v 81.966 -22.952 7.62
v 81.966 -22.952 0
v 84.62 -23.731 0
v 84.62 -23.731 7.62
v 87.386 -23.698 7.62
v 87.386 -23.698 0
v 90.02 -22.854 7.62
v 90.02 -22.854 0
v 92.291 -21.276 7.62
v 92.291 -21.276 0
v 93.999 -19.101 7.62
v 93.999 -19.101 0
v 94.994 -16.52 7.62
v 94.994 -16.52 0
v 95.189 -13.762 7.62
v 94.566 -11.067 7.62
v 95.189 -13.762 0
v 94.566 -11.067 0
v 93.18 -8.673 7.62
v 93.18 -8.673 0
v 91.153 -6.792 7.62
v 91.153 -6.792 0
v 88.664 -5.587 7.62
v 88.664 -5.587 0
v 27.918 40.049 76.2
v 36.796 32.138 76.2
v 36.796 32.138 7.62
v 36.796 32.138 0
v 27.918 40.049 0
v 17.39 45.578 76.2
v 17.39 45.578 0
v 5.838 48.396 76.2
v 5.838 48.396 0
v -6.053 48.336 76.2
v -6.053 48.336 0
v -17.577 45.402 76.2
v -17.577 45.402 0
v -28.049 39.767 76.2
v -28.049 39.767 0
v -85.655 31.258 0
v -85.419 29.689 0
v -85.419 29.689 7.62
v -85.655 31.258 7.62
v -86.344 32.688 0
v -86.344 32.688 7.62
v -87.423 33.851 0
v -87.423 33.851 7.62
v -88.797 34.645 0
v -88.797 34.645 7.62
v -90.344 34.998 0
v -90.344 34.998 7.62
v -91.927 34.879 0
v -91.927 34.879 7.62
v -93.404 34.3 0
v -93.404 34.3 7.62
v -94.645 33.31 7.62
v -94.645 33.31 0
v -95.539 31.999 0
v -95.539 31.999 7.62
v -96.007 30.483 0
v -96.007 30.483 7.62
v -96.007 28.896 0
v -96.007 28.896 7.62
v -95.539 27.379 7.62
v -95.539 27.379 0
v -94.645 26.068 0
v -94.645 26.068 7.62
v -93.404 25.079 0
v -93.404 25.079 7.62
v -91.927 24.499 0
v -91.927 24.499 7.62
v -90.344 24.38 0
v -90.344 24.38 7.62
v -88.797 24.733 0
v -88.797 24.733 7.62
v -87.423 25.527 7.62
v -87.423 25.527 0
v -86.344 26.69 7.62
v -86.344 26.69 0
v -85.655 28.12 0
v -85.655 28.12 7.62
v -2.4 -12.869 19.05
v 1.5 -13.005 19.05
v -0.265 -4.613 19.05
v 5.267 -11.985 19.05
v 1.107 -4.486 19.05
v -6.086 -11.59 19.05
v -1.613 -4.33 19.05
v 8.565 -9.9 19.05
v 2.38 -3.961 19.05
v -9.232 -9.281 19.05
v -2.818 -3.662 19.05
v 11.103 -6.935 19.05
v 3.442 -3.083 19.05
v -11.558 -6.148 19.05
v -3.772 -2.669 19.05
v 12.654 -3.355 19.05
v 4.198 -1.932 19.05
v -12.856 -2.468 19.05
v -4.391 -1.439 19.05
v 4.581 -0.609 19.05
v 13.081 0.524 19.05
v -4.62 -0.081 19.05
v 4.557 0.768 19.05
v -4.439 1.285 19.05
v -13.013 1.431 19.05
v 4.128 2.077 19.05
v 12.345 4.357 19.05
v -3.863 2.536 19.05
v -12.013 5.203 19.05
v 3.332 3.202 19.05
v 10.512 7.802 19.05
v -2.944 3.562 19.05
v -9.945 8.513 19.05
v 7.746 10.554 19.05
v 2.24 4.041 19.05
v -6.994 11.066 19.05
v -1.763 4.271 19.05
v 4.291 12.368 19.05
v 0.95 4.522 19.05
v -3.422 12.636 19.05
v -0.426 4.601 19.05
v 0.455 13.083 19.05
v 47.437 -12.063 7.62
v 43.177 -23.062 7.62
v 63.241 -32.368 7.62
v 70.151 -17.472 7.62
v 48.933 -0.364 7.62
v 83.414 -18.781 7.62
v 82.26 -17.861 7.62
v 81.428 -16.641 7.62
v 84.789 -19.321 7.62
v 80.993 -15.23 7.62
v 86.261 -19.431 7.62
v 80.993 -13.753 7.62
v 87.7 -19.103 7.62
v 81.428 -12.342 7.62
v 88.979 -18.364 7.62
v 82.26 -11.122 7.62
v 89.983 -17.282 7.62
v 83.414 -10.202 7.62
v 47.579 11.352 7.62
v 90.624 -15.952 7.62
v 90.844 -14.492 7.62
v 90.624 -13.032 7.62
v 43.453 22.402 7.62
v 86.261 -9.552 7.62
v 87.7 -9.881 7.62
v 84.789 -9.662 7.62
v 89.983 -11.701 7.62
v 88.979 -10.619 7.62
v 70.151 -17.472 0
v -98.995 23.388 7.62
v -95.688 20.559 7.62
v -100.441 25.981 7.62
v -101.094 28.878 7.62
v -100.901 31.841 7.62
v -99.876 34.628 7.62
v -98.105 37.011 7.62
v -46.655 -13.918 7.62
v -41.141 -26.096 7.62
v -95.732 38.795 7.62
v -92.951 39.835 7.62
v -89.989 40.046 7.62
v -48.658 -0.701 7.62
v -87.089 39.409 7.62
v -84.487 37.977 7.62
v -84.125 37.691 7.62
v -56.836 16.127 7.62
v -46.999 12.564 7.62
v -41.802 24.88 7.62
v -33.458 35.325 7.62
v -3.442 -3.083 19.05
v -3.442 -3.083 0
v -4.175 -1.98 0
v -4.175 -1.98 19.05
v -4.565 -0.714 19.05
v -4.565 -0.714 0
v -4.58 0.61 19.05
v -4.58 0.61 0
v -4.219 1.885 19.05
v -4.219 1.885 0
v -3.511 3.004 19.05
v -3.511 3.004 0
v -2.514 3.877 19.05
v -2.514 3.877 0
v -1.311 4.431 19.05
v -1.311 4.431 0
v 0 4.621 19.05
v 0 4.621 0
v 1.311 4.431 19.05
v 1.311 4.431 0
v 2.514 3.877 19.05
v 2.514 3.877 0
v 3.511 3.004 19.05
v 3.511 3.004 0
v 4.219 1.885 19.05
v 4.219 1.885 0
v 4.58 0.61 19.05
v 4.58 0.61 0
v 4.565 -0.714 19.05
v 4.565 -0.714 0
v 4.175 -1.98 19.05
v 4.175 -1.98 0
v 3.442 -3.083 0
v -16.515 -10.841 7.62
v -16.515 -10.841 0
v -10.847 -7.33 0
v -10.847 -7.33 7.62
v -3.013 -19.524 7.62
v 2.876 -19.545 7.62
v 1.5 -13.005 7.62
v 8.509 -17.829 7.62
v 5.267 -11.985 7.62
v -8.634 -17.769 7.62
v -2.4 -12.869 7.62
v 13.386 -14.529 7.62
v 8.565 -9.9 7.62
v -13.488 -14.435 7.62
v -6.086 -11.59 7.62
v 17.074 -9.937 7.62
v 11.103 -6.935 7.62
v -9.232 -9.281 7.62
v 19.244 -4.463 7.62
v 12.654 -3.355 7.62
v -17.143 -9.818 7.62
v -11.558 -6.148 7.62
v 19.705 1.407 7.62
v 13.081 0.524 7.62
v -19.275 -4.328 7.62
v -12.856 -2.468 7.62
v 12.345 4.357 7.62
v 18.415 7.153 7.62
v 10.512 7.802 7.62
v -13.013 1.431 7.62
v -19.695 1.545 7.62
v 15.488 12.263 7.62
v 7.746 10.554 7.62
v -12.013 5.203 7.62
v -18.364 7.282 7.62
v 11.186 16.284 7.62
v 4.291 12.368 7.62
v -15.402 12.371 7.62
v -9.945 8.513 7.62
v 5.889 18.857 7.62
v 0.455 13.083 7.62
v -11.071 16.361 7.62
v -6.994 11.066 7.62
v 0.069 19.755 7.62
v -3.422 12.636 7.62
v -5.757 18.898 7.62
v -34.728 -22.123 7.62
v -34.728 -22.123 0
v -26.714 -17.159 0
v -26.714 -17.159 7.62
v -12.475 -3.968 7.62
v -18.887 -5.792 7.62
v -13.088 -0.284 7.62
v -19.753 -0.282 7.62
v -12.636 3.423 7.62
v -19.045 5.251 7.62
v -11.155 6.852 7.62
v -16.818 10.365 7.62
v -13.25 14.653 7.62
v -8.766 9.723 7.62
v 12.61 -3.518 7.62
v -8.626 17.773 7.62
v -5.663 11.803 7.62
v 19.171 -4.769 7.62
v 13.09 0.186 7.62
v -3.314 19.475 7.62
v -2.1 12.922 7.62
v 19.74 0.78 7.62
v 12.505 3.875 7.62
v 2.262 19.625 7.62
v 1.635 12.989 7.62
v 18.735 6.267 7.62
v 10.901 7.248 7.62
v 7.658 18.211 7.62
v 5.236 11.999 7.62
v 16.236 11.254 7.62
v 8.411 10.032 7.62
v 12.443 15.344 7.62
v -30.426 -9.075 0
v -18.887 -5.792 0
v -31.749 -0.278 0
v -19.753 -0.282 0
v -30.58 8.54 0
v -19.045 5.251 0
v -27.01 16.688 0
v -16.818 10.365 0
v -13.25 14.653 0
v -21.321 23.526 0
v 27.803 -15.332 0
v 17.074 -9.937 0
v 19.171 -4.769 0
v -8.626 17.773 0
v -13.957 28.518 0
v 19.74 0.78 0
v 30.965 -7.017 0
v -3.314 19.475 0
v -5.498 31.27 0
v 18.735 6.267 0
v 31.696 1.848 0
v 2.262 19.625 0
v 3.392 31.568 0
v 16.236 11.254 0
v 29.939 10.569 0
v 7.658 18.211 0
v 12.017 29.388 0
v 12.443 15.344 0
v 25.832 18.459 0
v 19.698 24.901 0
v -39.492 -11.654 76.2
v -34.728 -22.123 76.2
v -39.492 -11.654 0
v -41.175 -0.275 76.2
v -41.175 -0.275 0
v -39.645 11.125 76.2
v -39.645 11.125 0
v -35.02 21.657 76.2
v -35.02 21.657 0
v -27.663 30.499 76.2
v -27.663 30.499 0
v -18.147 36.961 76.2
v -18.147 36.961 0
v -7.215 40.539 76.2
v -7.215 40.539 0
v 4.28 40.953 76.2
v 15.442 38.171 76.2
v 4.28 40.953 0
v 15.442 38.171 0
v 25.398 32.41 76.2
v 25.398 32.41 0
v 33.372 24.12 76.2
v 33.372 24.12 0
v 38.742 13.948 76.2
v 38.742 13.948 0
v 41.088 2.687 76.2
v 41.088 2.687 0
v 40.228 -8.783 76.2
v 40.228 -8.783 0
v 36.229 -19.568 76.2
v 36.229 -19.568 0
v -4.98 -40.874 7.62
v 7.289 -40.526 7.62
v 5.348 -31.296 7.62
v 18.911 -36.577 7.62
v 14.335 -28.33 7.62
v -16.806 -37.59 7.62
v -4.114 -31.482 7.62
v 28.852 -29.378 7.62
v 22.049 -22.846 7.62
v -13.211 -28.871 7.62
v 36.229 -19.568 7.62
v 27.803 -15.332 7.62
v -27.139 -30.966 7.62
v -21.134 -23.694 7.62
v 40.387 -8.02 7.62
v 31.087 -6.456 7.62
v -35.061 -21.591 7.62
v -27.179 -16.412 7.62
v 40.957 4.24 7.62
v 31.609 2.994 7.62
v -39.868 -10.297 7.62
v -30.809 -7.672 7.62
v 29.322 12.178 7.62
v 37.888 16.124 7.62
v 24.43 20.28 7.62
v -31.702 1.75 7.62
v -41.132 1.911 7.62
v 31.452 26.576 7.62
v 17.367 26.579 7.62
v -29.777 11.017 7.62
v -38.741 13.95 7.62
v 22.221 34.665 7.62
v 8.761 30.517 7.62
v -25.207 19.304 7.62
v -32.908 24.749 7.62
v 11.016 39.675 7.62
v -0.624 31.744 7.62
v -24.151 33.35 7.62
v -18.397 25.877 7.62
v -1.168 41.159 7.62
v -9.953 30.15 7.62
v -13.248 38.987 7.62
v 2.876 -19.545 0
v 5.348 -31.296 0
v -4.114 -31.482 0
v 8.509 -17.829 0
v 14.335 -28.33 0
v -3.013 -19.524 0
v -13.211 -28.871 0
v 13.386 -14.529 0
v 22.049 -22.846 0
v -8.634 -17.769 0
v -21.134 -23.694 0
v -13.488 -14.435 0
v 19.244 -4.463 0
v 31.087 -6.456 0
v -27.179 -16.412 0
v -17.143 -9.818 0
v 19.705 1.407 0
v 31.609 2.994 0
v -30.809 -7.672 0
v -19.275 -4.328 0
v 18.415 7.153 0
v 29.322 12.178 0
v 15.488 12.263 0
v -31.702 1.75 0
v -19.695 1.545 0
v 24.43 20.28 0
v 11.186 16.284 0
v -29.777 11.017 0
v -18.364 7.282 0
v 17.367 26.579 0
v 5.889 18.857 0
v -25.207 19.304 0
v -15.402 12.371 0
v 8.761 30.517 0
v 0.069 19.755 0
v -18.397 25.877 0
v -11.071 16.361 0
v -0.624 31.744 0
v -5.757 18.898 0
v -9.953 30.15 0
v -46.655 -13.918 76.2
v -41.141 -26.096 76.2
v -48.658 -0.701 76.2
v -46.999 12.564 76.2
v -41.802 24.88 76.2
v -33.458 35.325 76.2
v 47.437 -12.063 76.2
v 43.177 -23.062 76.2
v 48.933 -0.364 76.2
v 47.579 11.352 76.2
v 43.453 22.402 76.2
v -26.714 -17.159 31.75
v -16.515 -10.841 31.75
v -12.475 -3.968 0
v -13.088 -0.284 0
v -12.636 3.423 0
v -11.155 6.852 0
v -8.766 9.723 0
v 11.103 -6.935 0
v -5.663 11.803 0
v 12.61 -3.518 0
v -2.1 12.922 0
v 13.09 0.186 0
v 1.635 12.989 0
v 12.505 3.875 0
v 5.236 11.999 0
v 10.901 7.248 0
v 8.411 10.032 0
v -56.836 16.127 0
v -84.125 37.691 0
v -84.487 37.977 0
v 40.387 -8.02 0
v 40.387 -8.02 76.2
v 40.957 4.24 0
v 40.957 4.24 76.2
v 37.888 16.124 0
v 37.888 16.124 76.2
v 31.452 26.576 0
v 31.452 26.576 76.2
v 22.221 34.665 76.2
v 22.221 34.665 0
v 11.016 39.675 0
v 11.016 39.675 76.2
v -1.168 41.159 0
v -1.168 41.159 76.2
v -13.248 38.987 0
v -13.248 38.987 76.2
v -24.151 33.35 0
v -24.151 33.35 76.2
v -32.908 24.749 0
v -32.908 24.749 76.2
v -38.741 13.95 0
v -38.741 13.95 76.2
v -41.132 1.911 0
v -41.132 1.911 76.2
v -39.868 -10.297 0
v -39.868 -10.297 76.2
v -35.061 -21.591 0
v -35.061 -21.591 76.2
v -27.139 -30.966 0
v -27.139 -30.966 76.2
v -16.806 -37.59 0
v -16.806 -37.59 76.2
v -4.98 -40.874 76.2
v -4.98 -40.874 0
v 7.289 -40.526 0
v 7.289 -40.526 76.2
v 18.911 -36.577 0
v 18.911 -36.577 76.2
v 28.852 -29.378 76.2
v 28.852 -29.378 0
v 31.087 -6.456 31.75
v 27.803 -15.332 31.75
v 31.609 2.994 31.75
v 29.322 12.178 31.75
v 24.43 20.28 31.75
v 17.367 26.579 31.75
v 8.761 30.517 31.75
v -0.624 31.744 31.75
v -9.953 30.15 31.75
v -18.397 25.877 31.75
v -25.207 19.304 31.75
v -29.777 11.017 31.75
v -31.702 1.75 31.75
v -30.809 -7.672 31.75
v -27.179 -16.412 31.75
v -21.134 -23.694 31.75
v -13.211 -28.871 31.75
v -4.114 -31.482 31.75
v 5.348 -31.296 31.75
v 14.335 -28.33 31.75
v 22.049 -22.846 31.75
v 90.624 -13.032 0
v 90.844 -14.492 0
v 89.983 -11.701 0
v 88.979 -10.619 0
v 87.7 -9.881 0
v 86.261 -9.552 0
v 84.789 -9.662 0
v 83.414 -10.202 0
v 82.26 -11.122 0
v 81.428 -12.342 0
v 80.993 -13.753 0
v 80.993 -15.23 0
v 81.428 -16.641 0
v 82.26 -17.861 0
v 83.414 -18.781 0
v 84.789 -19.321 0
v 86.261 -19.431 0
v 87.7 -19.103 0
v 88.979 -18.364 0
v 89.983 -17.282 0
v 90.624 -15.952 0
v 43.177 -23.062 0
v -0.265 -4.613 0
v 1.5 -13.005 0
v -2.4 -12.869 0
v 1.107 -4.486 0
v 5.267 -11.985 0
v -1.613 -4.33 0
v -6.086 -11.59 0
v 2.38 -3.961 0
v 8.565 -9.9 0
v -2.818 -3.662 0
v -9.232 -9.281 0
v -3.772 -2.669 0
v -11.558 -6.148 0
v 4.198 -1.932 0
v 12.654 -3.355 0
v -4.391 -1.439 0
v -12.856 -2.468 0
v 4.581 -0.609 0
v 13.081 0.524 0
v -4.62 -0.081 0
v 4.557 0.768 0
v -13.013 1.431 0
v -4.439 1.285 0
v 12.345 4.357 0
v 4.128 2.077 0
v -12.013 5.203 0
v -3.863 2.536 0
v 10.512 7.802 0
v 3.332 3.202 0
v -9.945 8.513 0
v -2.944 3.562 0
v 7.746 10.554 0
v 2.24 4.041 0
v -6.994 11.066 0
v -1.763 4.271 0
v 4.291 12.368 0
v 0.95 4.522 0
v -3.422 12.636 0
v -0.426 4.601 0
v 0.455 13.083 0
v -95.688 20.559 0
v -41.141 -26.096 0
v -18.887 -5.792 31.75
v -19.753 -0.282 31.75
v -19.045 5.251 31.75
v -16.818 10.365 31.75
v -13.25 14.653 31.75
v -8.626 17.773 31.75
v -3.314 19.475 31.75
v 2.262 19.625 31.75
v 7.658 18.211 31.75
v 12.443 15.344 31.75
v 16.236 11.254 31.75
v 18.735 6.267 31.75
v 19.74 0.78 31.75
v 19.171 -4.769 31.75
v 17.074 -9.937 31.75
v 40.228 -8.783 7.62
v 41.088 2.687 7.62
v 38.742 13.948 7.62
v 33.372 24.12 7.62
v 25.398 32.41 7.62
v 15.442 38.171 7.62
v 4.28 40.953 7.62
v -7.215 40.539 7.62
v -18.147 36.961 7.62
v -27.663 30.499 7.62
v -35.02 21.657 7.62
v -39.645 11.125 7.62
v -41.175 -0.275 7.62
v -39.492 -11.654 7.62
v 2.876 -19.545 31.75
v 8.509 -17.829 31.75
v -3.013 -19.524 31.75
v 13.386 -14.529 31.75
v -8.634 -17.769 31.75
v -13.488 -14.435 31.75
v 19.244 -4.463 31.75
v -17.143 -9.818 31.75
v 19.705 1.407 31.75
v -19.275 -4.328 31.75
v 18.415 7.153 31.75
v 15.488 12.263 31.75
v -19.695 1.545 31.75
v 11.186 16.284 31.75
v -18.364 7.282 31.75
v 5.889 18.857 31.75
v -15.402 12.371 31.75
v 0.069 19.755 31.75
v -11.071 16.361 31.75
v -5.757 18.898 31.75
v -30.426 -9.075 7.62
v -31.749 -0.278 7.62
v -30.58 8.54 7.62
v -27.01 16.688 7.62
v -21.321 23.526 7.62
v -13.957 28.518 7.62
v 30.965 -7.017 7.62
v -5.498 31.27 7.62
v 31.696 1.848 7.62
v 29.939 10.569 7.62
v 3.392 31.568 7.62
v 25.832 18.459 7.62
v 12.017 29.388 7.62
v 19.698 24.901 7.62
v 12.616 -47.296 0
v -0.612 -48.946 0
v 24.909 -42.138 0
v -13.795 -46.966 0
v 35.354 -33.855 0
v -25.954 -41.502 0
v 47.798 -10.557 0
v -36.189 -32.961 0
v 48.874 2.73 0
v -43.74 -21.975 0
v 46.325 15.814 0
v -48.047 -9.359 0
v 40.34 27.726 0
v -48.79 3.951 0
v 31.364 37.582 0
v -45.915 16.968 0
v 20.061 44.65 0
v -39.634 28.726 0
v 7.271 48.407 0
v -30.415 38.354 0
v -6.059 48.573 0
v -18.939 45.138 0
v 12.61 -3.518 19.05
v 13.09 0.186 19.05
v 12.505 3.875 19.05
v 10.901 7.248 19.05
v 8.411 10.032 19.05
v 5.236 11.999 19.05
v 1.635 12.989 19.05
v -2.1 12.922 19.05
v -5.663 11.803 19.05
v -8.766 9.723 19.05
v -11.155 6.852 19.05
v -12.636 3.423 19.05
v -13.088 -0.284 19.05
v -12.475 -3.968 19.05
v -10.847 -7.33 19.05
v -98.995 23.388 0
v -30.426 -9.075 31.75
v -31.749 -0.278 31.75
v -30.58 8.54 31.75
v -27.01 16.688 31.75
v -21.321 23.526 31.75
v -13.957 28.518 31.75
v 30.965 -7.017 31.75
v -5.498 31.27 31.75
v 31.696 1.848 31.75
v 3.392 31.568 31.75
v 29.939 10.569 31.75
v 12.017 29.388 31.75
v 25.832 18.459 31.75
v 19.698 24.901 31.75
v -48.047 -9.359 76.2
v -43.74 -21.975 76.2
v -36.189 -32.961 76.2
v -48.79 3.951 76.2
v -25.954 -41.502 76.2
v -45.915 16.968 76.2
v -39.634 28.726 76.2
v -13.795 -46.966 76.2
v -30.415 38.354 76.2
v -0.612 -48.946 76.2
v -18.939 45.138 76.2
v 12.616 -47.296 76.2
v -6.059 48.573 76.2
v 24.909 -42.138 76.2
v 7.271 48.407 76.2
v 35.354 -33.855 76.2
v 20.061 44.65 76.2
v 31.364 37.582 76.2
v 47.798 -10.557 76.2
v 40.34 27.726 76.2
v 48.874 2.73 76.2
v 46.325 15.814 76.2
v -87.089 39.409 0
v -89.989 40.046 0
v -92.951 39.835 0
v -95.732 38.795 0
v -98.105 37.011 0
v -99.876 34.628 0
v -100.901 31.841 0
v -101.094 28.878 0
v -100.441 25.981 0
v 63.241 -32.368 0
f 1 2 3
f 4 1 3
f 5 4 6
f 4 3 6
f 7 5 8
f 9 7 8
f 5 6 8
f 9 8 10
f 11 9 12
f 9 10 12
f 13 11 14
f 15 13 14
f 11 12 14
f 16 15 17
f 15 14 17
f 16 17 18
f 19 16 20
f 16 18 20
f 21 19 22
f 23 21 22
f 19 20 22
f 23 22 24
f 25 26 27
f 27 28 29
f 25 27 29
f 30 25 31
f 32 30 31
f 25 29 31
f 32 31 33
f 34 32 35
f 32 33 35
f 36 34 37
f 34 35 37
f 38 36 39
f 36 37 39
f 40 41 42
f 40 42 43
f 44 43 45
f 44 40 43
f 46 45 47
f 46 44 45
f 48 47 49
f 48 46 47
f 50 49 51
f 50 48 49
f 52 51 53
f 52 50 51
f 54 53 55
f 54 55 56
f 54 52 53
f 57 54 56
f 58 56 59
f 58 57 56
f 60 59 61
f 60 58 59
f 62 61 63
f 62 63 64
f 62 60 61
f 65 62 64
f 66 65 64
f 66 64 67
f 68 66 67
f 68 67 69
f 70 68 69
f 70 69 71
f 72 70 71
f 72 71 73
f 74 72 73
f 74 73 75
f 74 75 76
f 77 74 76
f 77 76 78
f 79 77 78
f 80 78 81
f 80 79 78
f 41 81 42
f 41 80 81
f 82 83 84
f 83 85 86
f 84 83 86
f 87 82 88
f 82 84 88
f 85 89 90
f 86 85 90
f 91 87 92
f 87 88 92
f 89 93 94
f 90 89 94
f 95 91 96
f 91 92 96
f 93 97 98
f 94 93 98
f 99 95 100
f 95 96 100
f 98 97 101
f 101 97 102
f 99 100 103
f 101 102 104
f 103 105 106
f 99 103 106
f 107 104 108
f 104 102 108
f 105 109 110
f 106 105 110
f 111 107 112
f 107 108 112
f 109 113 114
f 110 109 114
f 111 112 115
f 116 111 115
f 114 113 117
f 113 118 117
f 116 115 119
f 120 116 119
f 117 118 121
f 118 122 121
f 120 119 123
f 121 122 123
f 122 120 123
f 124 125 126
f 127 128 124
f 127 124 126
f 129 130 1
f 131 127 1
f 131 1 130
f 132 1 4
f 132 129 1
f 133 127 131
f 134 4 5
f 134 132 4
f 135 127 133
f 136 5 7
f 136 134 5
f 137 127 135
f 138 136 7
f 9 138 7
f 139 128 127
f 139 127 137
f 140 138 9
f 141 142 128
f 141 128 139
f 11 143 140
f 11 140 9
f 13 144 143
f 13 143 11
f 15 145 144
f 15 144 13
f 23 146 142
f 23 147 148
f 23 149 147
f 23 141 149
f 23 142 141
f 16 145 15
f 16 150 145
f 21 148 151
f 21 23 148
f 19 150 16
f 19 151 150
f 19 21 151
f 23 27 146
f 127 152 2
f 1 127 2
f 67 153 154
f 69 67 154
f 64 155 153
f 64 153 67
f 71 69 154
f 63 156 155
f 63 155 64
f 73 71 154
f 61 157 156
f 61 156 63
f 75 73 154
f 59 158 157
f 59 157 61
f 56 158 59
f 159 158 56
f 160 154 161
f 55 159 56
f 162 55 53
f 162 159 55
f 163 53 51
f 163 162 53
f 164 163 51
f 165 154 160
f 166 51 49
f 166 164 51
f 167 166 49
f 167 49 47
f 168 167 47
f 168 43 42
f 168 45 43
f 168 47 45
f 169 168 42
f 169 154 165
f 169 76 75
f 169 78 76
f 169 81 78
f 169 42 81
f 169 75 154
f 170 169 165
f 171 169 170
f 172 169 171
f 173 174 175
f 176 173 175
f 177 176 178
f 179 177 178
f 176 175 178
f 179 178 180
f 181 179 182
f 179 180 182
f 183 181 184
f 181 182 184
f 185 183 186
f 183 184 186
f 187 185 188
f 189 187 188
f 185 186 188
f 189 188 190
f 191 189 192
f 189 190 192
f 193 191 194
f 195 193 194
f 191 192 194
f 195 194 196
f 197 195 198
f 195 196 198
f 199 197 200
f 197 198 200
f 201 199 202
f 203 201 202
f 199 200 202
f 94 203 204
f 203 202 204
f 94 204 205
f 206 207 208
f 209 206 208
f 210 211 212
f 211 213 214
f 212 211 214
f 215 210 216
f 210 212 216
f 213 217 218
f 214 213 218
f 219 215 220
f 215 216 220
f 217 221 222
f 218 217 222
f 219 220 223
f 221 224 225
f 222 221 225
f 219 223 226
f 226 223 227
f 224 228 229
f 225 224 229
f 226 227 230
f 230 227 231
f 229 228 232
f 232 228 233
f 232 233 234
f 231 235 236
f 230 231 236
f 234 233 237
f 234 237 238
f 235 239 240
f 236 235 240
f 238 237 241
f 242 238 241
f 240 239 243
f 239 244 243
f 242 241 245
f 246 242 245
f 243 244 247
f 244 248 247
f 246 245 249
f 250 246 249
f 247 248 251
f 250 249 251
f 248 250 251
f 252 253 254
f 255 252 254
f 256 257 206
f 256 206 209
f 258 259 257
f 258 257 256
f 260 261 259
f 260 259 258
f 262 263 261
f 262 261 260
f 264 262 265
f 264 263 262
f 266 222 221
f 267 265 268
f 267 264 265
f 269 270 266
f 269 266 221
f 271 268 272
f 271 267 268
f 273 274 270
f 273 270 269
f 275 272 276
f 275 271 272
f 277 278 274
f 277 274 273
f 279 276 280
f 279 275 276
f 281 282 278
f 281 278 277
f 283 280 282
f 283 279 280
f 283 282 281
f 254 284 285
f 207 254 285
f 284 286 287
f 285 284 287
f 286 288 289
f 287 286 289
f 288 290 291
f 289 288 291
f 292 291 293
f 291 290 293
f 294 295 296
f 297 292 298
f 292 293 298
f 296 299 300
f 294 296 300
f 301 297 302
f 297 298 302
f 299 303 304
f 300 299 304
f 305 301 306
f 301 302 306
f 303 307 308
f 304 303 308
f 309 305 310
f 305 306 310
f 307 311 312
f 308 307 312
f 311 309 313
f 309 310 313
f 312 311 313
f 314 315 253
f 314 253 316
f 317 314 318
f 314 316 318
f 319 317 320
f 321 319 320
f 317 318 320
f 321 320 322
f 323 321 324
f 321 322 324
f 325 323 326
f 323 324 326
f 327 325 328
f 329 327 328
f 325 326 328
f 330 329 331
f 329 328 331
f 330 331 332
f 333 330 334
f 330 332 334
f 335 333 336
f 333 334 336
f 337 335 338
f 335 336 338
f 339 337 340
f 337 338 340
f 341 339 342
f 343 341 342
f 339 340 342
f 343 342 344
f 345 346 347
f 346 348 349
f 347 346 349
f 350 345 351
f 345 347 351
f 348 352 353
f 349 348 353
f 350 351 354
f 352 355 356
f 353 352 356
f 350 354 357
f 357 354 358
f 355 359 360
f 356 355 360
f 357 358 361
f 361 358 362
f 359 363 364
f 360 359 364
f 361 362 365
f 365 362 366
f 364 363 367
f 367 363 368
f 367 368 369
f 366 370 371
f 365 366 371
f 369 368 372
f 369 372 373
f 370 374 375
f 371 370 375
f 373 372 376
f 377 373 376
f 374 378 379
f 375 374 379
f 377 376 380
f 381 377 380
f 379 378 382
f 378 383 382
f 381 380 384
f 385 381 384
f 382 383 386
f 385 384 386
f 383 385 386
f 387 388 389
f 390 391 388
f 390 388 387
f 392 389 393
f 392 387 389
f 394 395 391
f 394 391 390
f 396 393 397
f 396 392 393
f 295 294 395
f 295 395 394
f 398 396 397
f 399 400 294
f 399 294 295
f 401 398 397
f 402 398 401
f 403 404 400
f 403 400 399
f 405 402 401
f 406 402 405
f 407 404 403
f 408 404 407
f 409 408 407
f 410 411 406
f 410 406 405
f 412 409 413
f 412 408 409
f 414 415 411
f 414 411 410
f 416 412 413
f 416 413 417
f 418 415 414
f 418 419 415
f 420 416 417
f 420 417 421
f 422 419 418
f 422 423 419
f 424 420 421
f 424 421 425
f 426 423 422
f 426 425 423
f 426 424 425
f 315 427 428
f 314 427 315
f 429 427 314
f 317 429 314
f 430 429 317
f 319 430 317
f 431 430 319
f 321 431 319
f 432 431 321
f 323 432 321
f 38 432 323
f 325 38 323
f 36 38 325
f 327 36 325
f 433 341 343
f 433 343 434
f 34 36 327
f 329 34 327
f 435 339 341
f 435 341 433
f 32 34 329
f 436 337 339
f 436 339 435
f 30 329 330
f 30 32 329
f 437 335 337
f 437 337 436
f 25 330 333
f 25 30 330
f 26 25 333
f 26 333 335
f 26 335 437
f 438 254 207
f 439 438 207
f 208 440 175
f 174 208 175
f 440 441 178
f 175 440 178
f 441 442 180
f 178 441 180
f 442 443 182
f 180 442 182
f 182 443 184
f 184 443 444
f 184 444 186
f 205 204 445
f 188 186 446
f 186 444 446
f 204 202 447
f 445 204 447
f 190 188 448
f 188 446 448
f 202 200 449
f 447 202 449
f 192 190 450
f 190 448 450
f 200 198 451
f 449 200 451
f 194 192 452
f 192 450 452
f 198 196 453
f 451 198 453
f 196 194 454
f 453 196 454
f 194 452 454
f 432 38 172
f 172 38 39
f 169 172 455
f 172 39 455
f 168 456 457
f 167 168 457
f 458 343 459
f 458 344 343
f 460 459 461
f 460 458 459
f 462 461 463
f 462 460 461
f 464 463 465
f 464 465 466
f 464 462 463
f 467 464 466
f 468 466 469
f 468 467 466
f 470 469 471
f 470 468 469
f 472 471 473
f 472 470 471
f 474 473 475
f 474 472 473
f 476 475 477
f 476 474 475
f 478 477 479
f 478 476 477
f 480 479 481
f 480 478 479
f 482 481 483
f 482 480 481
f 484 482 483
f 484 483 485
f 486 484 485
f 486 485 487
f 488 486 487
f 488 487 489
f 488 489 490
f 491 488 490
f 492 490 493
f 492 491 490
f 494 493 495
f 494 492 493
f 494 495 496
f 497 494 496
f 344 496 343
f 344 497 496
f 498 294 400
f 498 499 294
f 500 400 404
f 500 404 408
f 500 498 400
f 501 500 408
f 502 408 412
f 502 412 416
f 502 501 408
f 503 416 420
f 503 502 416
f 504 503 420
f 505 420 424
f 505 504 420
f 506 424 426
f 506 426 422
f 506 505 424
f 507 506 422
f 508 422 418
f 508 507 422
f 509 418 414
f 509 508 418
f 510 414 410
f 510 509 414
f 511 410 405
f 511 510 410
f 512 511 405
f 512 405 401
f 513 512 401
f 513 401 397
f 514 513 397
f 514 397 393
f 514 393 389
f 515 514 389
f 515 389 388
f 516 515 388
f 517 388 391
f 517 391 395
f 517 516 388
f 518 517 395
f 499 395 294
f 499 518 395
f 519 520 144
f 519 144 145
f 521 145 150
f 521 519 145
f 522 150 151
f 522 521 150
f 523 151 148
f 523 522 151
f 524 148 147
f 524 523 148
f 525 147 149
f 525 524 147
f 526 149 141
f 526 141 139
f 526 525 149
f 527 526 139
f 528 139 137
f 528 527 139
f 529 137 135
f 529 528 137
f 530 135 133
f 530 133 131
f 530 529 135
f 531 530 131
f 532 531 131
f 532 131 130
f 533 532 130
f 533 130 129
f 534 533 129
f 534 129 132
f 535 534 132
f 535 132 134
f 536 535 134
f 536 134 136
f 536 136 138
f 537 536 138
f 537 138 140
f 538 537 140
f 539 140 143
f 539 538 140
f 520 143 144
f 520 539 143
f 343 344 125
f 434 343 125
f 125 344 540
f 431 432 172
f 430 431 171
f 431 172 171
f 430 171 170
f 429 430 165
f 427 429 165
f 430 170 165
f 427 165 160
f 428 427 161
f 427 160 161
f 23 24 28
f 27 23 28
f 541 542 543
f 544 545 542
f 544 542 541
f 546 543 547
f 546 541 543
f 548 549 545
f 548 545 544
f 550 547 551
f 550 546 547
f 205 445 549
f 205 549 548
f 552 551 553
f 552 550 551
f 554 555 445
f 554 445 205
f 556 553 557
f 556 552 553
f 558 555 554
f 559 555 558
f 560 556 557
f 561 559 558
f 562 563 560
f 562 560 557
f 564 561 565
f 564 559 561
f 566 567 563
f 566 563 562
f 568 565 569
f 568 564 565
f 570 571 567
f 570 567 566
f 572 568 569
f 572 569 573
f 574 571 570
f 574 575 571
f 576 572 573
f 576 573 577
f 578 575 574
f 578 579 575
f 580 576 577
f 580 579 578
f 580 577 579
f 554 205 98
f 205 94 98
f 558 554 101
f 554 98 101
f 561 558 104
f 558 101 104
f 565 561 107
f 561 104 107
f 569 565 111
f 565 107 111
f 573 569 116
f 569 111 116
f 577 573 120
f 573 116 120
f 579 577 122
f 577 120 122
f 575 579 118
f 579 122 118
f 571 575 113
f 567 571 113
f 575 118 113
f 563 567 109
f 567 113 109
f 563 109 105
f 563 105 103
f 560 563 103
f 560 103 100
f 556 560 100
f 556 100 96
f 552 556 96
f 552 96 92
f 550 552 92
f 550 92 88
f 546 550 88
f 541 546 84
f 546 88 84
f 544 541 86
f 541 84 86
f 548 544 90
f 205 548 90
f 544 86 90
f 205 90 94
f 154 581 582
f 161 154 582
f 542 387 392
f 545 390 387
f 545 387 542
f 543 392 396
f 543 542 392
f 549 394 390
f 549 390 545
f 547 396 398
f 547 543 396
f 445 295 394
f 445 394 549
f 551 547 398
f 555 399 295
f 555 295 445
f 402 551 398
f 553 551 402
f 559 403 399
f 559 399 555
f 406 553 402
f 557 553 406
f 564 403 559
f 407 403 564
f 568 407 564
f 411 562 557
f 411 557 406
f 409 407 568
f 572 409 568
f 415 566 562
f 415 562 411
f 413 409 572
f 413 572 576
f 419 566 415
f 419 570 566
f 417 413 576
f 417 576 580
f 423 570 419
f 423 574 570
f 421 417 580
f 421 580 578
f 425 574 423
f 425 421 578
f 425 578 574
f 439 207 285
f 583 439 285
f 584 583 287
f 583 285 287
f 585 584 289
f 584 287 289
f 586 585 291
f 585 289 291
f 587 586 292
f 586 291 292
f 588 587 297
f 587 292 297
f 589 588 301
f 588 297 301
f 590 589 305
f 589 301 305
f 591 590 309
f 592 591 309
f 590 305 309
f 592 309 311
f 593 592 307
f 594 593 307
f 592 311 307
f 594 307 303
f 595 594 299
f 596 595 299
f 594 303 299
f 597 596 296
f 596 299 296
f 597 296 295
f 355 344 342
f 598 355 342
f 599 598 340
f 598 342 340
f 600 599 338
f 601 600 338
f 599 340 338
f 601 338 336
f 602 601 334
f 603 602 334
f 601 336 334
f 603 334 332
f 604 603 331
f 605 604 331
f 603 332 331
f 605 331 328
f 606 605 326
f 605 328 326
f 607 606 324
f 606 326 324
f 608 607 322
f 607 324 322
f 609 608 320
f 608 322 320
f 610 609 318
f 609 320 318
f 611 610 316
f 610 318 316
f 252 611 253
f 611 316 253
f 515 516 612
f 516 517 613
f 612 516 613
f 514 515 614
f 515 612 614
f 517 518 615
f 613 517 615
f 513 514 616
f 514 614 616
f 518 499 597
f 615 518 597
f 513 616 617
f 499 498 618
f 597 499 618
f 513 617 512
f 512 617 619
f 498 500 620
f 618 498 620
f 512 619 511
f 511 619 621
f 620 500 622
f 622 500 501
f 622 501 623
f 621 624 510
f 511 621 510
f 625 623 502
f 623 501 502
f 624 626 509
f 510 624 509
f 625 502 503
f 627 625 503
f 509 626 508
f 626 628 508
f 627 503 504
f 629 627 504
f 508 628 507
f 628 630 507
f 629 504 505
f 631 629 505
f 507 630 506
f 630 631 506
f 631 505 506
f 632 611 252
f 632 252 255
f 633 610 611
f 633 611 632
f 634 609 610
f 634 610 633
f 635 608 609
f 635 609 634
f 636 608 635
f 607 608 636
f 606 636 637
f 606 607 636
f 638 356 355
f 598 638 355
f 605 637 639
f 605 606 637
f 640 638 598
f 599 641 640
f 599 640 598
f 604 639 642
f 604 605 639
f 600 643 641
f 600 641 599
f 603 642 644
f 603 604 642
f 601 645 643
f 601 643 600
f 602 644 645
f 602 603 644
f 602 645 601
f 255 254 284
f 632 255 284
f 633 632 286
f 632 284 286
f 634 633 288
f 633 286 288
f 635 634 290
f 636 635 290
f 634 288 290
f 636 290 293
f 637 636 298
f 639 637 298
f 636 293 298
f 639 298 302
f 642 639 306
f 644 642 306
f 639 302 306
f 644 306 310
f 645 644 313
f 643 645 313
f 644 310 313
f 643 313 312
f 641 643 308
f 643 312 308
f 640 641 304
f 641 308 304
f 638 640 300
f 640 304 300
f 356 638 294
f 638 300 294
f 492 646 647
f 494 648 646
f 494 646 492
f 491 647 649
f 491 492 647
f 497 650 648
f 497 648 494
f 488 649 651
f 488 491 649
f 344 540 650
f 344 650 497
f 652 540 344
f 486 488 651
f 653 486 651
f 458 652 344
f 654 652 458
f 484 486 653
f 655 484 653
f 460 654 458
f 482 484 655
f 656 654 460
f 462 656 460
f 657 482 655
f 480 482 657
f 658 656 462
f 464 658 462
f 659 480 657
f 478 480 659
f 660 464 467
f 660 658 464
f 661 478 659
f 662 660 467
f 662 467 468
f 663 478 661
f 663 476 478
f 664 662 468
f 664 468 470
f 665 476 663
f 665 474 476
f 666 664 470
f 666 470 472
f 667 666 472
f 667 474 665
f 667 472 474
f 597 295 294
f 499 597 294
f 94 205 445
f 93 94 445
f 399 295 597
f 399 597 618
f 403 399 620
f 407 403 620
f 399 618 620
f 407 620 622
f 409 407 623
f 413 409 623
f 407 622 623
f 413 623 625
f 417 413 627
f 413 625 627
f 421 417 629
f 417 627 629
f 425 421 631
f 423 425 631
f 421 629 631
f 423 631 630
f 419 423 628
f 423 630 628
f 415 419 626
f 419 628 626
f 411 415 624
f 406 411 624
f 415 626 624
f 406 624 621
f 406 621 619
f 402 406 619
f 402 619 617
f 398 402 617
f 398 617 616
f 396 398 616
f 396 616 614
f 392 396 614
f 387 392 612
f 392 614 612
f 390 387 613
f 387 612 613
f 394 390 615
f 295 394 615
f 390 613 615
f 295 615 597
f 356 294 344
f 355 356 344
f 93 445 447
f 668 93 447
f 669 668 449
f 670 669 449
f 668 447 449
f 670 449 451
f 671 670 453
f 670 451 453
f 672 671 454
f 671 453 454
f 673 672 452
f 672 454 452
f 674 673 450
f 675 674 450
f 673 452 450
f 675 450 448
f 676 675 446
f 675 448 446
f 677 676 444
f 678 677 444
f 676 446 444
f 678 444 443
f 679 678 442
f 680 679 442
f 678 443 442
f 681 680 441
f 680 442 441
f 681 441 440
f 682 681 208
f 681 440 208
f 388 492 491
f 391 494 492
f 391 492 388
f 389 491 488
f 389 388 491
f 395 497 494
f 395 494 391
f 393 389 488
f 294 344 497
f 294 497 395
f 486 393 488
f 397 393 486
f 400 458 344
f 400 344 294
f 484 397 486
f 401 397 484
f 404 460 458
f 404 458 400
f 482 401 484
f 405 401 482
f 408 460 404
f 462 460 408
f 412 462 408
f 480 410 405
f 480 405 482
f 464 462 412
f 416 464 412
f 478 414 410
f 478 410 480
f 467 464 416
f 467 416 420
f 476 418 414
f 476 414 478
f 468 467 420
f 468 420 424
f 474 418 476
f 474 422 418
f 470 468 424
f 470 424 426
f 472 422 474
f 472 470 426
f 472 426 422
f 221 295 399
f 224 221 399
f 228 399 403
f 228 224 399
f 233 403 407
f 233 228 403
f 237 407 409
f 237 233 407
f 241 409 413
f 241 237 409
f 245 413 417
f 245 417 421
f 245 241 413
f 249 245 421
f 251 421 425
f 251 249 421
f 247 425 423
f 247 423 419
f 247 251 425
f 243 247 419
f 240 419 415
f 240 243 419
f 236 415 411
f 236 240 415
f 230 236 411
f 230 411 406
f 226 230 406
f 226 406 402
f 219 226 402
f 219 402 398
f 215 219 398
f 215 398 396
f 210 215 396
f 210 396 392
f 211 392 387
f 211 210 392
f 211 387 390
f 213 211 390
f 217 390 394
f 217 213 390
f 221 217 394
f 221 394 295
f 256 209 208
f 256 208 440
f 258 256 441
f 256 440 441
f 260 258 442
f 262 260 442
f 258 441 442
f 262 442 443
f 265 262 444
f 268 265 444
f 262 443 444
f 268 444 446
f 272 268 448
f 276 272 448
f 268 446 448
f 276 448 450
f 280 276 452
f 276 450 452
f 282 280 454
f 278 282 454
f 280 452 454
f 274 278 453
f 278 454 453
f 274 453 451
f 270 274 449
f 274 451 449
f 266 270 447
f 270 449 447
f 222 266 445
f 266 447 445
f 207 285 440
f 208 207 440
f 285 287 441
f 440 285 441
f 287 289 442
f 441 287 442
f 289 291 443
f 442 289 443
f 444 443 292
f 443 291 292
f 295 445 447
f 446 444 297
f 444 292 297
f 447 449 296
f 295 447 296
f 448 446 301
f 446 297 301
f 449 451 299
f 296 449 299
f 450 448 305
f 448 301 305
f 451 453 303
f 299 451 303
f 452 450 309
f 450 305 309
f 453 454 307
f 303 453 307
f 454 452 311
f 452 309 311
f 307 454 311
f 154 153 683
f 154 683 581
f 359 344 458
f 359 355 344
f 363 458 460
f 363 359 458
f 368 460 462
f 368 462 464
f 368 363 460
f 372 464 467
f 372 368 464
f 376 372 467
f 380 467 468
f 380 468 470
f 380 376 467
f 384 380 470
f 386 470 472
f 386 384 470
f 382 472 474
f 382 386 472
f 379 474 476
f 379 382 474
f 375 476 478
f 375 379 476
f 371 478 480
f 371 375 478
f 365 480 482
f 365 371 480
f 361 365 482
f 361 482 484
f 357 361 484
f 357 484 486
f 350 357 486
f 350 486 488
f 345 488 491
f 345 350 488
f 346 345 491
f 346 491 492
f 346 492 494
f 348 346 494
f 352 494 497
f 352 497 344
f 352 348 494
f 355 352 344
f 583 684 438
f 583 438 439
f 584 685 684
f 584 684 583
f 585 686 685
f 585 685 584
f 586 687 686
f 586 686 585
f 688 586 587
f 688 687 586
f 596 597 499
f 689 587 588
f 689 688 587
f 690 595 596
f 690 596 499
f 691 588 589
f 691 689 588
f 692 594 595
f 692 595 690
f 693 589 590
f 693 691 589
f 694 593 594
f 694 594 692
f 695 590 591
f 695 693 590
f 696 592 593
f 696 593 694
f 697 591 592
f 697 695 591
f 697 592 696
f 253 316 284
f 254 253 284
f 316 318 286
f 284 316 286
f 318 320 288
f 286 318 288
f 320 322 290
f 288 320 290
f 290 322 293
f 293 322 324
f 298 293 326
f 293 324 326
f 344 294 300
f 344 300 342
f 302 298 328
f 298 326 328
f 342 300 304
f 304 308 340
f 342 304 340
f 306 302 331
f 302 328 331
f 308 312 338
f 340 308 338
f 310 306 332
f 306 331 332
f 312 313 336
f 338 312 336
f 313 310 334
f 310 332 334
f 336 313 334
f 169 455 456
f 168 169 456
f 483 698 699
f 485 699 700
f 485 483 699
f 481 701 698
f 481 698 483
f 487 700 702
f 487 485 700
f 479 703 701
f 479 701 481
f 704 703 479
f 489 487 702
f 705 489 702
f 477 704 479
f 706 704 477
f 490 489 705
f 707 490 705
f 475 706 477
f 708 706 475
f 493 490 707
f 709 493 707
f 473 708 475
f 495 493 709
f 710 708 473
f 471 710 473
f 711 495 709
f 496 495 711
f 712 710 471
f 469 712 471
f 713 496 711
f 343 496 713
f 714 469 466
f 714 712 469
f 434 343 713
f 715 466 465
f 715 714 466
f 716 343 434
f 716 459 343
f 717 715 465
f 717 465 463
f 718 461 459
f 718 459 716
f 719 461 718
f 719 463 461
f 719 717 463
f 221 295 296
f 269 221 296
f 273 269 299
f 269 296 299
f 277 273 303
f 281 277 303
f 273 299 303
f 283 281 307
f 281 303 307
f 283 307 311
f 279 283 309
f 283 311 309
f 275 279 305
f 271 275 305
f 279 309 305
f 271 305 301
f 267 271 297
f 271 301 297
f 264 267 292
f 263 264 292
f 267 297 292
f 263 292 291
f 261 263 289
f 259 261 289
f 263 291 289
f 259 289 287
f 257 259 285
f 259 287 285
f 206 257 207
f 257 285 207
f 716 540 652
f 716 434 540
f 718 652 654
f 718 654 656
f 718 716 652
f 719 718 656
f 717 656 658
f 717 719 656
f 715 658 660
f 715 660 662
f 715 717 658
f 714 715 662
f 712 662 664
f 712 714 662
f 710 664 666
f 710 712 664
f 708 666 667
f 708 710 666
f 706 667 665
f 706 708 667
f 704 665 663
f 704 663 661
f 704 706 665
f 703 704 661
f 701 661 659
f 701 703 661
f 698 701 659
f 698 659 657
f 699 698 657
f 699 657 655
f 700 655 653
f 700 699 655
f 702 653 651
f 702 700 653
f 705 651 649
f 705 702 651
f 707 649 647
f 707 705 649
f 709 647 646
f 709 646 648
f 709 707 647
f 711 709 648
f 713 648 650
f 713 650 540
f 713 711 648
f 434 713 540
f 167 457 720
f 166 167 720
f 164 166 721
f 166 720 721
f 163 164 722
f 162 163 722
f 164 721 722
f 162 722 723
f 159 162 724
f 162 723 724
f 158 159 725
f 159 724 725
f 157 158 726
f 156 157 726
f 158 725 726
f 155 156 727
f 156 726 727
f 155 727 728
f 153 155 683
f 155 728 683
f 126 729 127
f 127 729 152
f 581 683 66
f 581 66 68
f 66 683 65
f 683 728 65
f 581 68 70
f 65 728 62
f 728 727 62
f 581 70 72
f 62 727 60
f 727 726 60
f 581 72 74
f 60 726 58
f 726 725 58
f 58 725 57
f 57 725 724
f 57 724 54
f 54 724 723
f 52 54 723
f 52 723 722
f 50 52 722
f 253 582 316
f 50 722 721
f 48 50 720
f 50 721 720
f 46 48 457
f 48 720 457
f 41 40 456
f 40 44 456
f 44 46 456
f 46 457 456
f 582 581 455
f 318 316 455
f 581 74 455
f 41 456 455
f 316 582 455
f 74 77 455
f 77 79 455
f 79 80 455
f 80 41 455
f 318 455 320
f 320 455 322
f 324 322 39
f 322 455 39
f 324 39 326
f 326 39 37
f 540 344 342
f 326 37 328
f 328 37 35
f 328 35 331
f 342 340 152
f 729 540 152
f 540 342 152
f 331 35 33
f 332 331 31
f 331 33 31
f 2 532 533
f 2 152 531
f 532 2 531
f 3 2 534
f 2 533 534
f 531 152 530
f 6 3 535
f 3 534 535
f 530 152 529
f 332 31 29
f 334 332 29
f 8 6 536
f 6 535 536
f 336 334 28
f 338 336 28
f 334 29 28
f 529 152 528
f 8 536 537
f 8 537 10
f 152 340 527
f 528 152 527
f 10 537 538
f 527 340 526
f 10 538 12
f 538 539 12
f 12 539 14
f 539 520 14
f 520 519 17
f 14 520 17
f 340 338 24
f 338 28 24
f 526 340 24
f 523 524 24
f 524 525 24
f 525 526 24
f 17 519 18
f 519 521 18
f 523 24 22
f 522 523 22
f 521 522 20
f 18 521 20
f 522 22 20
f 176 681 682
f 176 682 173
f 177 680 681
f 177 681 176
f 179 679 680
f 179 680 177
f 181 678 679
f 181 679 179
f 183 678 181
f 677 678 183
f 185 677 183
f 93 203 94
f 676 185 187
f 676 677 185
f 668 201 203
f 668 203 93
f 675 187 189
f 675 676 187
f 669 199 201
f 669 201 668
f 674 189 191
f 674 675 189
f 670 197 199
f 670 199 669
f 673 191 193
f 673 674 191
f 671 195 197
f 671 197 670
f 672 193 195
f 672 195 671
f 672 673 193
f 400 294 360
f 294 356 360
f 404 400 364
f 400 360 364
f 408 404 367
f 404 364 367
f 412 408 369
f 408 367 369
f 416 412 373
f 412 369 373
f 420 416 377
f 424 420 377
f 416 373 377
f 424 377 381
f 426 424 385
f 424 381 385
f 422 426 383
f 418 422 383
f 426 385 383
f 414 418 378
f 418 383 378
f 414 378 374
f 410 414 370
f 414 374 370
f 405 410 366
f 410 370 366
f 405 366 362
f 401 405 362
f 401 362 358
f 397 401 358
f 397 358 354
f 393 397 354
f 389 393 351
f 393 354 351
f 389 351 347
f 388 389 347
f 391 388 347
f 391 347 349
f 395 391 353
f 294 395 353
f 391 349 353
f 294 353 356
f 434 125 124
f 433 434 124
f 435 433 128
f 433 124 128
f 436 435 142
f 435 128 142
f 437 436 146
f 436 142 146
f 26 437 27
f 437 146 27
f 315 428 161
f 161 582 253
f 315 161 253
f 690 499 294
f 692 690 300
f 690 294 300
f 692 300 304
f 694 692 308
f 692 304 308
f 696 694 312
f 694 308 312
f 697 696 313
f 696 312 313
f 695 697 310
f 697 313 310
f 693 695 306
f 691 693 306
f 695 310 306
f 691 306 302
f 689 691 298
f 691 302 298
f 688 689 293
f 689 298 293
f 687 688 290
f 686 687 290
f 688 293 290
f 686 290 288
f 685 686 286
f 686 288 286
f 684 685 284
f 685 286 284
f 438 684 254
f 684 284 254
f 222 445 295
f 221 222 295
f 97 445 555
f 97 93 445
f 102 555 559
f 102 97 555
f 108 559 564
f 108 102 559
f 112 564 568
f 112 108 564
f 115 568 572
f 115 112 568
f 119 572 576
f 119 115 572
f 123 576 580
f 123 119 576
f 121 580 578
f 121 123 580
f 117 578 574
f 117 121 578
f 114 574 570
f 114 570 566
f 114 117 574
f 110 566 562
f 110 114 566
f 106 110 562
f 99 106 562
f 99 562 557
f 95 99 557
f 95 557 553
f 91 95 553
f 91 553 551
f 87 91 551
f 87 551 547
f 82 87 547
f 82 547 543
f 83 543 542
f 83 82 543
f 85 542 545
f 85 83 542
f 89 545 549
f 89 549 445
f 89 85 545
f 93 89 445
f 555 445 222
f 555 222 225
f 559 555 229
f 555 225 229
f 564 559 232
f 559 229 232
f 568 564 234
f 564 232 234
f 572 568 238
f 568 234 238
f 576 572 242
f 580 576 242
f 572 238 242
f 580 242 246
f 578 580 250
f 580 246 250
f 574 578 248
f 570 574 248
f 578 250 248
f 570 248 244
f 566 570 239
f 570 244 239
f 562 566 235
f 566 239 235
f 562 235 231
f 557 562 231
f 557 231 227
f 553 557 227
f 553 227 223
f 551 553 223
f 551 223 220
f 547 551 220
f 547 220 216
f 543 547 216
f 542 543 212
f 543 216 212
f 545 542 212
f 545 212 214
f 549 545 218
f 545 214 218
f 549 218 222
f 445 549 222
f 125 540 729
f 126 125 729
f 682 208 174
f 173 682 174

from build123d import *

# Parameters (mm, degrees)
F1_DEPTH    = 76.2
F2_DEPTH    = 31.75
F3_DEPTH    = 19.05
F4_DEPTH    = 7.62
F0_R        = 5.3237425143
F0_R_2      = 4.9534162061
F5_DEPTH    = 7.62
F3_FACE_W   = 8.5752790356
F3_FACE_H   = 19.05
F4_FACE_W   = 6.683049505
F4_FACE_H   = 7.62
F4_FACE_W_2 = 9.4312422922
F2_FACE_W   = 12.0087136189
F2_FACE_H   = 31.75


with BuildPart() as f1:
    # F0 (on Top) → F1 (new body)
    with BuildSketch(Plane.XY):
        with BuildLine():
            ThreePointArc((-34.7276751002, -22.1234954401), (-1.4817887575, 41.1492985412), (36.229000688, -19.5683412047))
            Line((36.229000688, -19.5683412047), (43.1768703502, -23.0616035662))
            ThreePointArc((43.1768703502, -23.0616035662), (48.6110092481, 5.5352725012), (36.79628914, 32.1383470443))
            ThreePointArc((36.79628914, 32.1383470443), (5.8376711749, 48.3955973291), (-28.0487168356, 39.767334425))
            Line((-28.0487168356, 39.767334425), (-33.4583891256, 35.3247881419))
            ThreePointArc((-33.4583891256, 35.3247881419), (-48.2846004863, 5.9882266817), (-41.1406287564, -26.0962563208))
            Line((-41.1406287564, -26.0962563208), (-34.7276751002, -22.1234954401))
        make_face()
    extrude(amount=F1_DEPTH)

    # F0 (on Top) → F5 (join)
    with BuildSketch(Plane.XY):
        with BuildLine():
            Line((-95.6883374581, 20.5591361861), (-41.1406287564, -26.0962563208))
            ThreePointArc((-41.1406287564, -26.0962563208), (-48.2846004863, 5.9882266817), (-33.4583891256, 35.3247881419))
            Line((-33.4583891256, 35.3247881419), (-56.8358898163, 16.1266513169))
            Line((-56.8358898163, 16.1266513169), (-84.1245320571, 37.6909004407))
            Line((-84.1245320571, 37.6909004407), (-84.4872106208, 37.977499196))
            ThreePointArc((-84.4872106208, 37.977499196), (-98.1053344669, 37.010885929), (-98.9951891018, 23.3875310917))
            Line((-98.9951891018, 23.3875310917), (-95.6883374581, 20.5591361861))
        make_face()
        with Locations((-90.7422751188, 29.6892039478)):
            Circle(F0_R, mode=Mode.SUBTRACT)
        with BuildLine():
            ThreePointArc((36.79628914, 32.1383470443), (48.6110092481, 5.5352725012), (43.1768703502, -23.0616035662))
            Line((43.1768703502, -23.0616035662), (63.2413849235, -32.3682539165))
            Line((63.2413849235, -32.3682539165), (70.1508525199, -17.47190474))
            Line((70.1508525199, -17.47190474), (81.9663336142, -22.9523538614))
            ThreePointArc((81.9663336142, -22.9523538614), (94.592598316, -17.8477131564), (88.663908183, -5.5867772071))
            Line((88.663908183, -5.5867772071), (36.79628914, 32.1383470443))
        make_face()
        with Locations((85.8907501141, -14.4915748388)):
            Circle(F0_R_2, mode=Mode.SUBTRACT)
    extrude(amount=F5_DEPTH)


with BuildPart() as f2:
    # F0 (on Top) → F2 (new body)
    with BuildSketch(Plane.XY):
        with BuildLine():
            ThreePointArc((-16.5150094424, -10.8409305661), (-0.5311619735, 19.7481436945), (17.0738827518, -9.9374966766))
            Line((17.0738827518, -9.9374966766), (27.8028379132, -15.3318199824))
            ThreePointArc((27.8028379132, -15.3318199824), (-1.0635461504, 31.7321819229), (-26.7138643474, -17.1590195415))
            Line((-26.7138643474, -17.1590195415), (-16.5150094424, -10.8409305661))
        make_face()
    extrude(amount=F2_DEPTH)


with BuildPart() as f3:
    # F0 (on Top) → F3 (new body)
    with BuildSketch(Plane.XY):
        with BuildLine():
            ThreePointArc((-3.4416213836, -3.0834438726), (0, 4.6208639737), (3.4416213836, -3.0834438726))
            Line((3.4416213836, -3.0834438726), (11.1030401824, -6.9354657479))
            ThreePointArc((11.1030401824, -6.9354657479), (-0.2350235497, 13.0890393216), (-10.8469003109, -7.3295934455))
            Line((-10.8469003109, -7.3295934455), (-3.4416213836, -3.0834438726))
        make_face()
    extrude(amount=F3_DEPTH)


with BuildPart() as f4:
    # F0 (on Top) → F4 (new body)
    with BuildSketch(Plane.XY):
        with BuildLine():
            ThreePointArc((-10.8469003109, -7.3295934455), (-0.2350235497, 13.0890393216), (11.1030401824, -6.9354657479))
            Line((11.1030401824, -6.9354657479), (17.0738827518, -9.9374966766))
            ThreePointArc((17.0738827518, -9.9374966766), (-0.5311619735, 19.7481436945), (-16.5150094424, -10.8409305661))
            Line((-16.5150094424, -10.8409305661), (-10.8469003109, -7.3295934455))
        make_face()
    extrude(amount=F4_DEPTH)


with BuildPart() as f4b:
    # F0 (on Top) → F4, piece 2 (new body)
    with BuildSketch(Plane.XY):
        with BuildLine():
            ThreePointArc((-26.7138643474, -17.1590195415), (-1.0635461504, 31.7321819229), (27.8028379132, -15.3318199824))
            Line((27.8028379132, -15.3318199824), (36.229000688, -19.5683412047))
            ThreePointArc((36.229000688, -19.5683412047), (-1.4817887575, 41.1492985412), (-34.7276751002, -22.1234954401))
            Line((-34.7276751002, -22.1234954401), (-26.7138643474, -17.1590195415))
        make_face()
    extrude(amount=F4_DEPTH)


with BuildPart() as f7:
    # F3_face (on face) → F7 (revolve)
    with BuildSketch(Plane(origin=(7.272330783, -5.0094548102, 9.525), x_dir=(0.8934308455, -0.4492007618, 0), z_dir=(-0.4492007618, -0.8934308455, 0))):
        Rectangle(F3_FACE_W, F3_FACE_H)
    revolve(axis=Axis((0, 0, 42.0711003244), (0, 0, 1)))


with BuildPart() as f7b:
    # F4_face (on face) → F7, piece 2 (revolve)
    with BuildSketch(Plane(origin=(14.0884614671, -8.4364812123, 3.81), x_dir=(0.8934308455, -0.4492007618, 0), z_dir=(-0.4492007618, -0.8934308455, 0))):
        Rectangle(F4_FACE_W, F4_FACE_H)
    revolve(axis=Axis((0, 0, 42.0711003244), (0, 0, 1)))


with BuildPart() as f7c:
    # F4_face (on face) → F7, piece 3 (revolve)
    with BuildSketch(Plane(origin=(14.0884614671, -8.4364812123, 3.81), x_dir=(0.8934308455, -0.4492007618, 0), z_dir=(-0.4492007618, -0.8934308455, 0))):
        with Locations((20.0658595175, 0)):
            Rectangle(F4_FACE_W_2, F4_FACE_H)
    revolve(axis=Axis((0, 0, 42.0711003244), (0, 0, 1)))


with BuildPart() as f7d:
    # F2_face (on face) → F7, piece 4 (revolve)
    with BuildSketch(Plane(origin=(22.4383603325, -12.6346583295, 15.875), x_dir=(0.8934308455, -0.4492007618, 0), z_dir=(-0.4492007618, -0.8934308455, 0))):
        Rectangle(F2_FACE_W, F2_FACE_H)
    revolve(axis=Axis((0, 0, 42.0711003244), (0, 0, 1)))


with BuildPart() as f7e:
    # F1_face (on face) → F7, piece 5 (revolve)
    with BuildSketch(Plane(origin=(39.7029355191, -21.3149723855, 38.1), x_dir=(0.8934308455, -0.4492007618, 0), z_dir=(-0.4492007618, -0.8934308455, 0))):
        Polygon((-3.8883085902, 38.1), (-3.8883085902, -38.1), (3.8883085902, -38.1), (3.8883085902, -30.48), (3.8883085902, 38.1), align=None)
    revolve(axis=Axis((0, 0, 42.0711003244), (0, 0, 1)))


solid = Compound([f1.part, f2.part, f3.part, f4.part, f4b.part, f7.part, f7b.part, f7c.part, f7d.part, f7e.part])
